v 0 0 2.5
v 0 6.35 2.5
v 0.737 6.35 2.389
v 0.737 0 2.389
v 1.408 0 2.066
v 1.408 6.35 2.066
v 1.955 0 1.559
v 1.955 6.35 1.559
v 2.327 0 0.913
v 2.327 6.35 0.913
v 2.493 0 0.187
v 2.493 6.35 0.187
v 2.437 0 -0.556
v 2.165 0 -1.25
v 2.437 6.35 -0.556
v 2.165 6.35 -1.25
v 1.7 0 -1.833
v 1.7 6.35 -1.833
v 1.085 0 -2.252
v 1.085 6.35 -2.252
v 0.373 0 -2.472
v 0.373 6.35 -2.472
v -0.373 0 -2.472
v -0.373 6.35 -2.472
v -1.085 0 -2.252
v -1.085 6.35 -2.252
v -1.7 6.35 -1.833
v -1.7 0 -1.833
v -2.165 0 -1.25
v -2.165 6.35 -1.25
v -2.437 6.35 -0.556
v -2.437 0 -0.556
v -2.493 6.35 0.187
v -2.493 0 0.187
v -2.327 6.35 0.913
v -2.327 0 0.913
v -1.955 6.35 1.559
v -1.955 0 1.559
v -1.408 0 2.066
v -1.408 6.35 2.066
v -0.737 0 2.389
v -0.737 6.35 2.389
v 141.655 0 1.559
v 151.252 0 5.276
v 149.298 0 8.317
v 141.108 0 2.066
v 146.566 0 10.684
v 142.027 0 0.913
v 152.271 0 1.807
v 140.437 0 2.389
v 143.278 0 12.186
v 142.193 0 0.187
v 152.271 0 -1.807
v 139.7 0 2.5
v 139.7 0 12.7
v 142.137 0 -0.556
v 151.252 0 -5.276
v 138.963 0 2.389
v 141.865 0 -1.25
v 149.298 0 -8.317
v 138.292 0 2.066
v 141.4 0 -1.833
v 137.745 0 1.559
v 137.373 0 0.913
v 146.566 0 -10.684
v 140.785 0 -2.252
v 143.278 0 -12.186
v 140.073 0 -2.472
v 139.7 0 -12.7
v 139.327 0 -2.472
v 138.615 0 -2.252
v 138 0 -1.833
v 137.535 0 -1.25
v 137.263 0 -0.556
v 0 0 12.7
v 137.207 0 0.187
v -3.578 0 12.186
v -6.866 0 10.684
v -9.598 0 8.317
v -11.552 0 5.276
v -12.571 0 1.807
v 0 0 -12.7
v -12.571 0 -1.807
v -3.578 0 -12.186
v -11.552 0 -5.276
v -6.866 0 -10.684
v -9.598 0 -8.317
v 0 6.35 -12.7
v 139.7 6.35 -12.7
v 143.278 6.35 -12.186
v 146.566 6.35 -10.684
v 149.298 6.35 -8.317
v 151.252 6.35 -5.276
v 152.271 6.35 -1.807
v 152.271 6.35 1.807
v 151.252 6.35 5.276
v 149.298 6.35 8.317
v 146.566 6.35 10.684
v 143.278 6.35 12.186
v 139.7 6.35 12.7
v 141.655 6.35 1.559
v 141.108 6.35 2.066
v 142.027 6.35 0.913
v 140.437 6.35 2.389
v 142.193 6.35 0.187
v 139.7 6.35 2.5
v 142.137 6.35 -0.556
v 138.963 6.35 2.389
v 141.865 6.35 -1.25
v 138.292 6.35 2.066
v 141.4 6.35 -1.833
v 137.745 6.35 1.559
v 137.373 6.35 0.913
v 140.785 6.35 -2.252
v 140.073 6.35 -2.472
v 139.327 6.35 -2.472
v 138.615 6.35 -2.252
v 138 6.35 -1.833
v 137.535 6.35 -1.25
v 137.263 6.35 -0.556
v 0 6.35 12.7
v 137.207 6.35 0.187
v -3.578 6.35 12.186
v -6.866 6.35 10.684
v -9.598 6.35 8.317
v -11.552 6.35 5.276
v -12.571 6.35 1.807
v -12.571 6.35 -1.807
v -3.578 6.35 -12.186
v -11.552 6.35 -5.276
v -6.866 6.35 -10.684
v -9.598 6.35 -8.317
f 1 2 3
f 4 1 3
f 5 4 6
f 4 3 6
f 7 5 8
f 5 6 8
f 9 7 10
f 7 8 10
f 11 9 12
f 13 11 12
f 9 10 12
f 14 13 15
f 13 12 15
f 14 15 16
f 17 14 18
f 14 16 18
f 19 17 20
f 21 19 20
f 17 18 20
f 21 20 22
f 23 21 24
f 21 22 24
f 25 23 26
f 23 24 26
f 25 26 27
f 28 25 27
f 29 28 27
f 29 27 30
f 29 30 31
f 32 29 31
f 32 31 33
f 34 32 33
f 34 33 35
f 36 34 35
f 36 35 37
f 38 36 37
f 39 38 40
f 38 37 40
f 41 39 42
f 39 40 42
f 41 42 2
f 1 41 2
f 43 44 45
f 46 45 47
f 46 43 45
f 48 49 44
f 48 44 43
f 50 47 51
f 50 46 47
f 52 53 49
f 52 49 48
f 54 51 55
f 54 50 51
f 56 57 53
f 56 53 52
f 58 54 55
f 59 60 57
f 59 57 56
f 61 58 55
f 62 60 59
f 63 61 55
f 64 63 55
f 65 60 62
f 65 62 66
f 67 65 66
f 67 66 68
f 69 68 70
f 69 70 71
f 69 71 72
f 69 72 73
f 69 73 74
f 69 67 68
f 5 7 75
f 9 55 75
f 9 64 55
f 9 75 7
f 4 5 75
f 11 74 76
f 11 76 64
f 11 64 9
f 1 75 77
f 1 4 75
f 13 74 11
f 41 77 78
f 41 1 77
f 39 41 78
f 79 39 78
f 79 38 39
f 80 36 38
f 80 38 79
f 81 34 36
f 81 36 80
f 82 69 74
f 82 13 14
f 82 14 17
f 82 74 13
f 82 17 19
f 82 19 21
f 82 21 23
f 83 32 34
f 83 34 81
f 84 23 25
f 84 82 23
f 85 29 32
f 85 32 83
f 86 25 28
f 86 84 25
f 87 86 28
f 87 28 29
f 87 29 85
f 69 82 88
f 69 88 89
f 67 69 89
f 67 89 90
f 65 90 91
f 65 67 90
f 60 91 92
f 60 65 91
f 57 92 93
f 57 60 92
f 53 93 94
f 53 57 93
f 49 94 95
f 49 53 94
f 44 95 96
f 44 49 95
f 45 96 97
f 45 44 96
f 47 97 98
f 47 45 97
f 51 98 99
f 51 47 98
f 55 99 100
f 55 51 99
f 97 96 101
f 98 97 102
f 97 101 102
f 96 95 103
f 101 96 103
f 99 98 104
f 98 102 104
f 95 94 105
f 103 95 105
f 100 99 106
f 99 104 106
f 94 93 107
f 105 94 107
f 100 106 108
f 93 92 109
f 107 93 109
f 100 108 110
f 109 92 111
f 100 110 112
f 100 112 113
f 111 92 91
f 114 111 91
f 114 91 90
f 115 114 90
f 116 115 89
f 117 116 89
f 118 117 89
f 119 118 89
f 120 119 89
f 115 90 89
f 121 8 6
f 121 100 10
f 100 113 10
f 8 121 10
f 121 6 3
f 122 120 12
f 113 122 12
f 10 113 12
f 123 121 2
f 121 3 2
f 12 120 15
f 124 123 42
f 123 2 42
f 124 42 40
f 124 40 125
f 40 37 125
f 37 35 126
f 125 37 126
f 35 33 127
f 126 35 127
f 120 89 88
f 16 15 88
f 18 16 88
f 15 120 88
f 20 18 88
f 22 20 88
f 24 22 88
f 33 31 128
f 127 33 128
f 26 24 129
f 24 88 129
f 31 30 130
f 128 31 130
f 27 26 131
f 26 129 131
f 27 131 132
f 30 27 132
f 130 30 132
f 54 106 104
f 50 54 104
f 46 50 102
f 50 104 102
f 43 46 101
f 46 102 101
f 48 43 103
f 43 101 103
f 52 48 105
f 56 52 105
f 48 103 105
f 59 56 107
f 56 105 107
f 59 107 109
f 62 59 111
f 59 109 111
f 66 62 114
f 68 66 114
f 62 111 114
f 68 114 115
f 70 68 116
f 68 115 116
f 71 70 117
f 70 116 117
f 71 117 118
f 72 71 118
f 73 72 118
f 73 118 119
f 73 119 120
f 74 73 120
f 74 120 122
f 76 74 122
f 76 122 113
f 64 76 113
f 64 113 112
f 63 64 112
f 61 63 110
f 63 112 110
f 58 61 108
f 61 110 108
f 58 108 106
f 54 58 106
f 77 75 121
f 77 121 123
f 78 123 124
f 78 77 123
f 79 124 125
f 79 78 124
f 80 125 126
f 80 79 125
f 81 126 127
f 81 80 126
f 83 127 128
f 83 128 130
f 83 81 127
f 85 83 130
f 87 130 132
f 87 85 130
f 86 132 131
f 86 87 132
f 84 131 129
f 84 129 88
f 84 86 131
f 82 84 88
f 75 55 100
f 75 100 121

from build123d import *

# Parameters (mm, degrees)
BOSS_EXTRUDE1_DEPTH = 6.35
SKETCH3_R           = 2.499999953
CUT_EXTRUDE1_DEPTH  = 6.35
LPATTERN1_COUNT     = 2
LPATTERN1_PITCH     = 139.7


with BuildPart() as part:
    # Sketch1 → Boss-Extrude1 (new body)
    with BuildSketch(Plane(origin=(0, 0, 0), x_dir=(1, 0, 0), z_dir=(0, 1, 0))):
        with BuildLine():
            Line((0, 12.7), (139.7, 12.7))
            ThreePointArc((139.7, 12.7), (152.4, 0), (139.7, -12.7))
            Line((139.7, -12.7), (0, -12.7))
            ThreePointArc((0, -12.7), (-12.7, 0), (0, 12.7))
        make_face()
    extrude(amount=BOSS_EXTRUDE1_DEPTH)

    # Sketch3 → Cut-Extrude1 (cut)
    with BuildSketch(Plane(origin=(0, 6.35, 0), x_dir=(1, 0, 0), z_dir=(0, 1, 0))):
        with Locations(Location((0, 0, 0), (0, 0, 270))):
            Circle(SKETCH3_R)
    cut_extrude1 = extrude(amount=-CUT_EXTRUDE1_DEPTH, mode=Mode.SUBTRACT)

    # LPattern1: Cut-Extrude1 ×2
    with Locations(*[(i * LPATTERN1_PITCH, 0, 0) for i in range(1, LPATTERN1_COUNT)]):
        add(cut_extrude1, mode=Mode.SUBTRACT)


solid = part.part
